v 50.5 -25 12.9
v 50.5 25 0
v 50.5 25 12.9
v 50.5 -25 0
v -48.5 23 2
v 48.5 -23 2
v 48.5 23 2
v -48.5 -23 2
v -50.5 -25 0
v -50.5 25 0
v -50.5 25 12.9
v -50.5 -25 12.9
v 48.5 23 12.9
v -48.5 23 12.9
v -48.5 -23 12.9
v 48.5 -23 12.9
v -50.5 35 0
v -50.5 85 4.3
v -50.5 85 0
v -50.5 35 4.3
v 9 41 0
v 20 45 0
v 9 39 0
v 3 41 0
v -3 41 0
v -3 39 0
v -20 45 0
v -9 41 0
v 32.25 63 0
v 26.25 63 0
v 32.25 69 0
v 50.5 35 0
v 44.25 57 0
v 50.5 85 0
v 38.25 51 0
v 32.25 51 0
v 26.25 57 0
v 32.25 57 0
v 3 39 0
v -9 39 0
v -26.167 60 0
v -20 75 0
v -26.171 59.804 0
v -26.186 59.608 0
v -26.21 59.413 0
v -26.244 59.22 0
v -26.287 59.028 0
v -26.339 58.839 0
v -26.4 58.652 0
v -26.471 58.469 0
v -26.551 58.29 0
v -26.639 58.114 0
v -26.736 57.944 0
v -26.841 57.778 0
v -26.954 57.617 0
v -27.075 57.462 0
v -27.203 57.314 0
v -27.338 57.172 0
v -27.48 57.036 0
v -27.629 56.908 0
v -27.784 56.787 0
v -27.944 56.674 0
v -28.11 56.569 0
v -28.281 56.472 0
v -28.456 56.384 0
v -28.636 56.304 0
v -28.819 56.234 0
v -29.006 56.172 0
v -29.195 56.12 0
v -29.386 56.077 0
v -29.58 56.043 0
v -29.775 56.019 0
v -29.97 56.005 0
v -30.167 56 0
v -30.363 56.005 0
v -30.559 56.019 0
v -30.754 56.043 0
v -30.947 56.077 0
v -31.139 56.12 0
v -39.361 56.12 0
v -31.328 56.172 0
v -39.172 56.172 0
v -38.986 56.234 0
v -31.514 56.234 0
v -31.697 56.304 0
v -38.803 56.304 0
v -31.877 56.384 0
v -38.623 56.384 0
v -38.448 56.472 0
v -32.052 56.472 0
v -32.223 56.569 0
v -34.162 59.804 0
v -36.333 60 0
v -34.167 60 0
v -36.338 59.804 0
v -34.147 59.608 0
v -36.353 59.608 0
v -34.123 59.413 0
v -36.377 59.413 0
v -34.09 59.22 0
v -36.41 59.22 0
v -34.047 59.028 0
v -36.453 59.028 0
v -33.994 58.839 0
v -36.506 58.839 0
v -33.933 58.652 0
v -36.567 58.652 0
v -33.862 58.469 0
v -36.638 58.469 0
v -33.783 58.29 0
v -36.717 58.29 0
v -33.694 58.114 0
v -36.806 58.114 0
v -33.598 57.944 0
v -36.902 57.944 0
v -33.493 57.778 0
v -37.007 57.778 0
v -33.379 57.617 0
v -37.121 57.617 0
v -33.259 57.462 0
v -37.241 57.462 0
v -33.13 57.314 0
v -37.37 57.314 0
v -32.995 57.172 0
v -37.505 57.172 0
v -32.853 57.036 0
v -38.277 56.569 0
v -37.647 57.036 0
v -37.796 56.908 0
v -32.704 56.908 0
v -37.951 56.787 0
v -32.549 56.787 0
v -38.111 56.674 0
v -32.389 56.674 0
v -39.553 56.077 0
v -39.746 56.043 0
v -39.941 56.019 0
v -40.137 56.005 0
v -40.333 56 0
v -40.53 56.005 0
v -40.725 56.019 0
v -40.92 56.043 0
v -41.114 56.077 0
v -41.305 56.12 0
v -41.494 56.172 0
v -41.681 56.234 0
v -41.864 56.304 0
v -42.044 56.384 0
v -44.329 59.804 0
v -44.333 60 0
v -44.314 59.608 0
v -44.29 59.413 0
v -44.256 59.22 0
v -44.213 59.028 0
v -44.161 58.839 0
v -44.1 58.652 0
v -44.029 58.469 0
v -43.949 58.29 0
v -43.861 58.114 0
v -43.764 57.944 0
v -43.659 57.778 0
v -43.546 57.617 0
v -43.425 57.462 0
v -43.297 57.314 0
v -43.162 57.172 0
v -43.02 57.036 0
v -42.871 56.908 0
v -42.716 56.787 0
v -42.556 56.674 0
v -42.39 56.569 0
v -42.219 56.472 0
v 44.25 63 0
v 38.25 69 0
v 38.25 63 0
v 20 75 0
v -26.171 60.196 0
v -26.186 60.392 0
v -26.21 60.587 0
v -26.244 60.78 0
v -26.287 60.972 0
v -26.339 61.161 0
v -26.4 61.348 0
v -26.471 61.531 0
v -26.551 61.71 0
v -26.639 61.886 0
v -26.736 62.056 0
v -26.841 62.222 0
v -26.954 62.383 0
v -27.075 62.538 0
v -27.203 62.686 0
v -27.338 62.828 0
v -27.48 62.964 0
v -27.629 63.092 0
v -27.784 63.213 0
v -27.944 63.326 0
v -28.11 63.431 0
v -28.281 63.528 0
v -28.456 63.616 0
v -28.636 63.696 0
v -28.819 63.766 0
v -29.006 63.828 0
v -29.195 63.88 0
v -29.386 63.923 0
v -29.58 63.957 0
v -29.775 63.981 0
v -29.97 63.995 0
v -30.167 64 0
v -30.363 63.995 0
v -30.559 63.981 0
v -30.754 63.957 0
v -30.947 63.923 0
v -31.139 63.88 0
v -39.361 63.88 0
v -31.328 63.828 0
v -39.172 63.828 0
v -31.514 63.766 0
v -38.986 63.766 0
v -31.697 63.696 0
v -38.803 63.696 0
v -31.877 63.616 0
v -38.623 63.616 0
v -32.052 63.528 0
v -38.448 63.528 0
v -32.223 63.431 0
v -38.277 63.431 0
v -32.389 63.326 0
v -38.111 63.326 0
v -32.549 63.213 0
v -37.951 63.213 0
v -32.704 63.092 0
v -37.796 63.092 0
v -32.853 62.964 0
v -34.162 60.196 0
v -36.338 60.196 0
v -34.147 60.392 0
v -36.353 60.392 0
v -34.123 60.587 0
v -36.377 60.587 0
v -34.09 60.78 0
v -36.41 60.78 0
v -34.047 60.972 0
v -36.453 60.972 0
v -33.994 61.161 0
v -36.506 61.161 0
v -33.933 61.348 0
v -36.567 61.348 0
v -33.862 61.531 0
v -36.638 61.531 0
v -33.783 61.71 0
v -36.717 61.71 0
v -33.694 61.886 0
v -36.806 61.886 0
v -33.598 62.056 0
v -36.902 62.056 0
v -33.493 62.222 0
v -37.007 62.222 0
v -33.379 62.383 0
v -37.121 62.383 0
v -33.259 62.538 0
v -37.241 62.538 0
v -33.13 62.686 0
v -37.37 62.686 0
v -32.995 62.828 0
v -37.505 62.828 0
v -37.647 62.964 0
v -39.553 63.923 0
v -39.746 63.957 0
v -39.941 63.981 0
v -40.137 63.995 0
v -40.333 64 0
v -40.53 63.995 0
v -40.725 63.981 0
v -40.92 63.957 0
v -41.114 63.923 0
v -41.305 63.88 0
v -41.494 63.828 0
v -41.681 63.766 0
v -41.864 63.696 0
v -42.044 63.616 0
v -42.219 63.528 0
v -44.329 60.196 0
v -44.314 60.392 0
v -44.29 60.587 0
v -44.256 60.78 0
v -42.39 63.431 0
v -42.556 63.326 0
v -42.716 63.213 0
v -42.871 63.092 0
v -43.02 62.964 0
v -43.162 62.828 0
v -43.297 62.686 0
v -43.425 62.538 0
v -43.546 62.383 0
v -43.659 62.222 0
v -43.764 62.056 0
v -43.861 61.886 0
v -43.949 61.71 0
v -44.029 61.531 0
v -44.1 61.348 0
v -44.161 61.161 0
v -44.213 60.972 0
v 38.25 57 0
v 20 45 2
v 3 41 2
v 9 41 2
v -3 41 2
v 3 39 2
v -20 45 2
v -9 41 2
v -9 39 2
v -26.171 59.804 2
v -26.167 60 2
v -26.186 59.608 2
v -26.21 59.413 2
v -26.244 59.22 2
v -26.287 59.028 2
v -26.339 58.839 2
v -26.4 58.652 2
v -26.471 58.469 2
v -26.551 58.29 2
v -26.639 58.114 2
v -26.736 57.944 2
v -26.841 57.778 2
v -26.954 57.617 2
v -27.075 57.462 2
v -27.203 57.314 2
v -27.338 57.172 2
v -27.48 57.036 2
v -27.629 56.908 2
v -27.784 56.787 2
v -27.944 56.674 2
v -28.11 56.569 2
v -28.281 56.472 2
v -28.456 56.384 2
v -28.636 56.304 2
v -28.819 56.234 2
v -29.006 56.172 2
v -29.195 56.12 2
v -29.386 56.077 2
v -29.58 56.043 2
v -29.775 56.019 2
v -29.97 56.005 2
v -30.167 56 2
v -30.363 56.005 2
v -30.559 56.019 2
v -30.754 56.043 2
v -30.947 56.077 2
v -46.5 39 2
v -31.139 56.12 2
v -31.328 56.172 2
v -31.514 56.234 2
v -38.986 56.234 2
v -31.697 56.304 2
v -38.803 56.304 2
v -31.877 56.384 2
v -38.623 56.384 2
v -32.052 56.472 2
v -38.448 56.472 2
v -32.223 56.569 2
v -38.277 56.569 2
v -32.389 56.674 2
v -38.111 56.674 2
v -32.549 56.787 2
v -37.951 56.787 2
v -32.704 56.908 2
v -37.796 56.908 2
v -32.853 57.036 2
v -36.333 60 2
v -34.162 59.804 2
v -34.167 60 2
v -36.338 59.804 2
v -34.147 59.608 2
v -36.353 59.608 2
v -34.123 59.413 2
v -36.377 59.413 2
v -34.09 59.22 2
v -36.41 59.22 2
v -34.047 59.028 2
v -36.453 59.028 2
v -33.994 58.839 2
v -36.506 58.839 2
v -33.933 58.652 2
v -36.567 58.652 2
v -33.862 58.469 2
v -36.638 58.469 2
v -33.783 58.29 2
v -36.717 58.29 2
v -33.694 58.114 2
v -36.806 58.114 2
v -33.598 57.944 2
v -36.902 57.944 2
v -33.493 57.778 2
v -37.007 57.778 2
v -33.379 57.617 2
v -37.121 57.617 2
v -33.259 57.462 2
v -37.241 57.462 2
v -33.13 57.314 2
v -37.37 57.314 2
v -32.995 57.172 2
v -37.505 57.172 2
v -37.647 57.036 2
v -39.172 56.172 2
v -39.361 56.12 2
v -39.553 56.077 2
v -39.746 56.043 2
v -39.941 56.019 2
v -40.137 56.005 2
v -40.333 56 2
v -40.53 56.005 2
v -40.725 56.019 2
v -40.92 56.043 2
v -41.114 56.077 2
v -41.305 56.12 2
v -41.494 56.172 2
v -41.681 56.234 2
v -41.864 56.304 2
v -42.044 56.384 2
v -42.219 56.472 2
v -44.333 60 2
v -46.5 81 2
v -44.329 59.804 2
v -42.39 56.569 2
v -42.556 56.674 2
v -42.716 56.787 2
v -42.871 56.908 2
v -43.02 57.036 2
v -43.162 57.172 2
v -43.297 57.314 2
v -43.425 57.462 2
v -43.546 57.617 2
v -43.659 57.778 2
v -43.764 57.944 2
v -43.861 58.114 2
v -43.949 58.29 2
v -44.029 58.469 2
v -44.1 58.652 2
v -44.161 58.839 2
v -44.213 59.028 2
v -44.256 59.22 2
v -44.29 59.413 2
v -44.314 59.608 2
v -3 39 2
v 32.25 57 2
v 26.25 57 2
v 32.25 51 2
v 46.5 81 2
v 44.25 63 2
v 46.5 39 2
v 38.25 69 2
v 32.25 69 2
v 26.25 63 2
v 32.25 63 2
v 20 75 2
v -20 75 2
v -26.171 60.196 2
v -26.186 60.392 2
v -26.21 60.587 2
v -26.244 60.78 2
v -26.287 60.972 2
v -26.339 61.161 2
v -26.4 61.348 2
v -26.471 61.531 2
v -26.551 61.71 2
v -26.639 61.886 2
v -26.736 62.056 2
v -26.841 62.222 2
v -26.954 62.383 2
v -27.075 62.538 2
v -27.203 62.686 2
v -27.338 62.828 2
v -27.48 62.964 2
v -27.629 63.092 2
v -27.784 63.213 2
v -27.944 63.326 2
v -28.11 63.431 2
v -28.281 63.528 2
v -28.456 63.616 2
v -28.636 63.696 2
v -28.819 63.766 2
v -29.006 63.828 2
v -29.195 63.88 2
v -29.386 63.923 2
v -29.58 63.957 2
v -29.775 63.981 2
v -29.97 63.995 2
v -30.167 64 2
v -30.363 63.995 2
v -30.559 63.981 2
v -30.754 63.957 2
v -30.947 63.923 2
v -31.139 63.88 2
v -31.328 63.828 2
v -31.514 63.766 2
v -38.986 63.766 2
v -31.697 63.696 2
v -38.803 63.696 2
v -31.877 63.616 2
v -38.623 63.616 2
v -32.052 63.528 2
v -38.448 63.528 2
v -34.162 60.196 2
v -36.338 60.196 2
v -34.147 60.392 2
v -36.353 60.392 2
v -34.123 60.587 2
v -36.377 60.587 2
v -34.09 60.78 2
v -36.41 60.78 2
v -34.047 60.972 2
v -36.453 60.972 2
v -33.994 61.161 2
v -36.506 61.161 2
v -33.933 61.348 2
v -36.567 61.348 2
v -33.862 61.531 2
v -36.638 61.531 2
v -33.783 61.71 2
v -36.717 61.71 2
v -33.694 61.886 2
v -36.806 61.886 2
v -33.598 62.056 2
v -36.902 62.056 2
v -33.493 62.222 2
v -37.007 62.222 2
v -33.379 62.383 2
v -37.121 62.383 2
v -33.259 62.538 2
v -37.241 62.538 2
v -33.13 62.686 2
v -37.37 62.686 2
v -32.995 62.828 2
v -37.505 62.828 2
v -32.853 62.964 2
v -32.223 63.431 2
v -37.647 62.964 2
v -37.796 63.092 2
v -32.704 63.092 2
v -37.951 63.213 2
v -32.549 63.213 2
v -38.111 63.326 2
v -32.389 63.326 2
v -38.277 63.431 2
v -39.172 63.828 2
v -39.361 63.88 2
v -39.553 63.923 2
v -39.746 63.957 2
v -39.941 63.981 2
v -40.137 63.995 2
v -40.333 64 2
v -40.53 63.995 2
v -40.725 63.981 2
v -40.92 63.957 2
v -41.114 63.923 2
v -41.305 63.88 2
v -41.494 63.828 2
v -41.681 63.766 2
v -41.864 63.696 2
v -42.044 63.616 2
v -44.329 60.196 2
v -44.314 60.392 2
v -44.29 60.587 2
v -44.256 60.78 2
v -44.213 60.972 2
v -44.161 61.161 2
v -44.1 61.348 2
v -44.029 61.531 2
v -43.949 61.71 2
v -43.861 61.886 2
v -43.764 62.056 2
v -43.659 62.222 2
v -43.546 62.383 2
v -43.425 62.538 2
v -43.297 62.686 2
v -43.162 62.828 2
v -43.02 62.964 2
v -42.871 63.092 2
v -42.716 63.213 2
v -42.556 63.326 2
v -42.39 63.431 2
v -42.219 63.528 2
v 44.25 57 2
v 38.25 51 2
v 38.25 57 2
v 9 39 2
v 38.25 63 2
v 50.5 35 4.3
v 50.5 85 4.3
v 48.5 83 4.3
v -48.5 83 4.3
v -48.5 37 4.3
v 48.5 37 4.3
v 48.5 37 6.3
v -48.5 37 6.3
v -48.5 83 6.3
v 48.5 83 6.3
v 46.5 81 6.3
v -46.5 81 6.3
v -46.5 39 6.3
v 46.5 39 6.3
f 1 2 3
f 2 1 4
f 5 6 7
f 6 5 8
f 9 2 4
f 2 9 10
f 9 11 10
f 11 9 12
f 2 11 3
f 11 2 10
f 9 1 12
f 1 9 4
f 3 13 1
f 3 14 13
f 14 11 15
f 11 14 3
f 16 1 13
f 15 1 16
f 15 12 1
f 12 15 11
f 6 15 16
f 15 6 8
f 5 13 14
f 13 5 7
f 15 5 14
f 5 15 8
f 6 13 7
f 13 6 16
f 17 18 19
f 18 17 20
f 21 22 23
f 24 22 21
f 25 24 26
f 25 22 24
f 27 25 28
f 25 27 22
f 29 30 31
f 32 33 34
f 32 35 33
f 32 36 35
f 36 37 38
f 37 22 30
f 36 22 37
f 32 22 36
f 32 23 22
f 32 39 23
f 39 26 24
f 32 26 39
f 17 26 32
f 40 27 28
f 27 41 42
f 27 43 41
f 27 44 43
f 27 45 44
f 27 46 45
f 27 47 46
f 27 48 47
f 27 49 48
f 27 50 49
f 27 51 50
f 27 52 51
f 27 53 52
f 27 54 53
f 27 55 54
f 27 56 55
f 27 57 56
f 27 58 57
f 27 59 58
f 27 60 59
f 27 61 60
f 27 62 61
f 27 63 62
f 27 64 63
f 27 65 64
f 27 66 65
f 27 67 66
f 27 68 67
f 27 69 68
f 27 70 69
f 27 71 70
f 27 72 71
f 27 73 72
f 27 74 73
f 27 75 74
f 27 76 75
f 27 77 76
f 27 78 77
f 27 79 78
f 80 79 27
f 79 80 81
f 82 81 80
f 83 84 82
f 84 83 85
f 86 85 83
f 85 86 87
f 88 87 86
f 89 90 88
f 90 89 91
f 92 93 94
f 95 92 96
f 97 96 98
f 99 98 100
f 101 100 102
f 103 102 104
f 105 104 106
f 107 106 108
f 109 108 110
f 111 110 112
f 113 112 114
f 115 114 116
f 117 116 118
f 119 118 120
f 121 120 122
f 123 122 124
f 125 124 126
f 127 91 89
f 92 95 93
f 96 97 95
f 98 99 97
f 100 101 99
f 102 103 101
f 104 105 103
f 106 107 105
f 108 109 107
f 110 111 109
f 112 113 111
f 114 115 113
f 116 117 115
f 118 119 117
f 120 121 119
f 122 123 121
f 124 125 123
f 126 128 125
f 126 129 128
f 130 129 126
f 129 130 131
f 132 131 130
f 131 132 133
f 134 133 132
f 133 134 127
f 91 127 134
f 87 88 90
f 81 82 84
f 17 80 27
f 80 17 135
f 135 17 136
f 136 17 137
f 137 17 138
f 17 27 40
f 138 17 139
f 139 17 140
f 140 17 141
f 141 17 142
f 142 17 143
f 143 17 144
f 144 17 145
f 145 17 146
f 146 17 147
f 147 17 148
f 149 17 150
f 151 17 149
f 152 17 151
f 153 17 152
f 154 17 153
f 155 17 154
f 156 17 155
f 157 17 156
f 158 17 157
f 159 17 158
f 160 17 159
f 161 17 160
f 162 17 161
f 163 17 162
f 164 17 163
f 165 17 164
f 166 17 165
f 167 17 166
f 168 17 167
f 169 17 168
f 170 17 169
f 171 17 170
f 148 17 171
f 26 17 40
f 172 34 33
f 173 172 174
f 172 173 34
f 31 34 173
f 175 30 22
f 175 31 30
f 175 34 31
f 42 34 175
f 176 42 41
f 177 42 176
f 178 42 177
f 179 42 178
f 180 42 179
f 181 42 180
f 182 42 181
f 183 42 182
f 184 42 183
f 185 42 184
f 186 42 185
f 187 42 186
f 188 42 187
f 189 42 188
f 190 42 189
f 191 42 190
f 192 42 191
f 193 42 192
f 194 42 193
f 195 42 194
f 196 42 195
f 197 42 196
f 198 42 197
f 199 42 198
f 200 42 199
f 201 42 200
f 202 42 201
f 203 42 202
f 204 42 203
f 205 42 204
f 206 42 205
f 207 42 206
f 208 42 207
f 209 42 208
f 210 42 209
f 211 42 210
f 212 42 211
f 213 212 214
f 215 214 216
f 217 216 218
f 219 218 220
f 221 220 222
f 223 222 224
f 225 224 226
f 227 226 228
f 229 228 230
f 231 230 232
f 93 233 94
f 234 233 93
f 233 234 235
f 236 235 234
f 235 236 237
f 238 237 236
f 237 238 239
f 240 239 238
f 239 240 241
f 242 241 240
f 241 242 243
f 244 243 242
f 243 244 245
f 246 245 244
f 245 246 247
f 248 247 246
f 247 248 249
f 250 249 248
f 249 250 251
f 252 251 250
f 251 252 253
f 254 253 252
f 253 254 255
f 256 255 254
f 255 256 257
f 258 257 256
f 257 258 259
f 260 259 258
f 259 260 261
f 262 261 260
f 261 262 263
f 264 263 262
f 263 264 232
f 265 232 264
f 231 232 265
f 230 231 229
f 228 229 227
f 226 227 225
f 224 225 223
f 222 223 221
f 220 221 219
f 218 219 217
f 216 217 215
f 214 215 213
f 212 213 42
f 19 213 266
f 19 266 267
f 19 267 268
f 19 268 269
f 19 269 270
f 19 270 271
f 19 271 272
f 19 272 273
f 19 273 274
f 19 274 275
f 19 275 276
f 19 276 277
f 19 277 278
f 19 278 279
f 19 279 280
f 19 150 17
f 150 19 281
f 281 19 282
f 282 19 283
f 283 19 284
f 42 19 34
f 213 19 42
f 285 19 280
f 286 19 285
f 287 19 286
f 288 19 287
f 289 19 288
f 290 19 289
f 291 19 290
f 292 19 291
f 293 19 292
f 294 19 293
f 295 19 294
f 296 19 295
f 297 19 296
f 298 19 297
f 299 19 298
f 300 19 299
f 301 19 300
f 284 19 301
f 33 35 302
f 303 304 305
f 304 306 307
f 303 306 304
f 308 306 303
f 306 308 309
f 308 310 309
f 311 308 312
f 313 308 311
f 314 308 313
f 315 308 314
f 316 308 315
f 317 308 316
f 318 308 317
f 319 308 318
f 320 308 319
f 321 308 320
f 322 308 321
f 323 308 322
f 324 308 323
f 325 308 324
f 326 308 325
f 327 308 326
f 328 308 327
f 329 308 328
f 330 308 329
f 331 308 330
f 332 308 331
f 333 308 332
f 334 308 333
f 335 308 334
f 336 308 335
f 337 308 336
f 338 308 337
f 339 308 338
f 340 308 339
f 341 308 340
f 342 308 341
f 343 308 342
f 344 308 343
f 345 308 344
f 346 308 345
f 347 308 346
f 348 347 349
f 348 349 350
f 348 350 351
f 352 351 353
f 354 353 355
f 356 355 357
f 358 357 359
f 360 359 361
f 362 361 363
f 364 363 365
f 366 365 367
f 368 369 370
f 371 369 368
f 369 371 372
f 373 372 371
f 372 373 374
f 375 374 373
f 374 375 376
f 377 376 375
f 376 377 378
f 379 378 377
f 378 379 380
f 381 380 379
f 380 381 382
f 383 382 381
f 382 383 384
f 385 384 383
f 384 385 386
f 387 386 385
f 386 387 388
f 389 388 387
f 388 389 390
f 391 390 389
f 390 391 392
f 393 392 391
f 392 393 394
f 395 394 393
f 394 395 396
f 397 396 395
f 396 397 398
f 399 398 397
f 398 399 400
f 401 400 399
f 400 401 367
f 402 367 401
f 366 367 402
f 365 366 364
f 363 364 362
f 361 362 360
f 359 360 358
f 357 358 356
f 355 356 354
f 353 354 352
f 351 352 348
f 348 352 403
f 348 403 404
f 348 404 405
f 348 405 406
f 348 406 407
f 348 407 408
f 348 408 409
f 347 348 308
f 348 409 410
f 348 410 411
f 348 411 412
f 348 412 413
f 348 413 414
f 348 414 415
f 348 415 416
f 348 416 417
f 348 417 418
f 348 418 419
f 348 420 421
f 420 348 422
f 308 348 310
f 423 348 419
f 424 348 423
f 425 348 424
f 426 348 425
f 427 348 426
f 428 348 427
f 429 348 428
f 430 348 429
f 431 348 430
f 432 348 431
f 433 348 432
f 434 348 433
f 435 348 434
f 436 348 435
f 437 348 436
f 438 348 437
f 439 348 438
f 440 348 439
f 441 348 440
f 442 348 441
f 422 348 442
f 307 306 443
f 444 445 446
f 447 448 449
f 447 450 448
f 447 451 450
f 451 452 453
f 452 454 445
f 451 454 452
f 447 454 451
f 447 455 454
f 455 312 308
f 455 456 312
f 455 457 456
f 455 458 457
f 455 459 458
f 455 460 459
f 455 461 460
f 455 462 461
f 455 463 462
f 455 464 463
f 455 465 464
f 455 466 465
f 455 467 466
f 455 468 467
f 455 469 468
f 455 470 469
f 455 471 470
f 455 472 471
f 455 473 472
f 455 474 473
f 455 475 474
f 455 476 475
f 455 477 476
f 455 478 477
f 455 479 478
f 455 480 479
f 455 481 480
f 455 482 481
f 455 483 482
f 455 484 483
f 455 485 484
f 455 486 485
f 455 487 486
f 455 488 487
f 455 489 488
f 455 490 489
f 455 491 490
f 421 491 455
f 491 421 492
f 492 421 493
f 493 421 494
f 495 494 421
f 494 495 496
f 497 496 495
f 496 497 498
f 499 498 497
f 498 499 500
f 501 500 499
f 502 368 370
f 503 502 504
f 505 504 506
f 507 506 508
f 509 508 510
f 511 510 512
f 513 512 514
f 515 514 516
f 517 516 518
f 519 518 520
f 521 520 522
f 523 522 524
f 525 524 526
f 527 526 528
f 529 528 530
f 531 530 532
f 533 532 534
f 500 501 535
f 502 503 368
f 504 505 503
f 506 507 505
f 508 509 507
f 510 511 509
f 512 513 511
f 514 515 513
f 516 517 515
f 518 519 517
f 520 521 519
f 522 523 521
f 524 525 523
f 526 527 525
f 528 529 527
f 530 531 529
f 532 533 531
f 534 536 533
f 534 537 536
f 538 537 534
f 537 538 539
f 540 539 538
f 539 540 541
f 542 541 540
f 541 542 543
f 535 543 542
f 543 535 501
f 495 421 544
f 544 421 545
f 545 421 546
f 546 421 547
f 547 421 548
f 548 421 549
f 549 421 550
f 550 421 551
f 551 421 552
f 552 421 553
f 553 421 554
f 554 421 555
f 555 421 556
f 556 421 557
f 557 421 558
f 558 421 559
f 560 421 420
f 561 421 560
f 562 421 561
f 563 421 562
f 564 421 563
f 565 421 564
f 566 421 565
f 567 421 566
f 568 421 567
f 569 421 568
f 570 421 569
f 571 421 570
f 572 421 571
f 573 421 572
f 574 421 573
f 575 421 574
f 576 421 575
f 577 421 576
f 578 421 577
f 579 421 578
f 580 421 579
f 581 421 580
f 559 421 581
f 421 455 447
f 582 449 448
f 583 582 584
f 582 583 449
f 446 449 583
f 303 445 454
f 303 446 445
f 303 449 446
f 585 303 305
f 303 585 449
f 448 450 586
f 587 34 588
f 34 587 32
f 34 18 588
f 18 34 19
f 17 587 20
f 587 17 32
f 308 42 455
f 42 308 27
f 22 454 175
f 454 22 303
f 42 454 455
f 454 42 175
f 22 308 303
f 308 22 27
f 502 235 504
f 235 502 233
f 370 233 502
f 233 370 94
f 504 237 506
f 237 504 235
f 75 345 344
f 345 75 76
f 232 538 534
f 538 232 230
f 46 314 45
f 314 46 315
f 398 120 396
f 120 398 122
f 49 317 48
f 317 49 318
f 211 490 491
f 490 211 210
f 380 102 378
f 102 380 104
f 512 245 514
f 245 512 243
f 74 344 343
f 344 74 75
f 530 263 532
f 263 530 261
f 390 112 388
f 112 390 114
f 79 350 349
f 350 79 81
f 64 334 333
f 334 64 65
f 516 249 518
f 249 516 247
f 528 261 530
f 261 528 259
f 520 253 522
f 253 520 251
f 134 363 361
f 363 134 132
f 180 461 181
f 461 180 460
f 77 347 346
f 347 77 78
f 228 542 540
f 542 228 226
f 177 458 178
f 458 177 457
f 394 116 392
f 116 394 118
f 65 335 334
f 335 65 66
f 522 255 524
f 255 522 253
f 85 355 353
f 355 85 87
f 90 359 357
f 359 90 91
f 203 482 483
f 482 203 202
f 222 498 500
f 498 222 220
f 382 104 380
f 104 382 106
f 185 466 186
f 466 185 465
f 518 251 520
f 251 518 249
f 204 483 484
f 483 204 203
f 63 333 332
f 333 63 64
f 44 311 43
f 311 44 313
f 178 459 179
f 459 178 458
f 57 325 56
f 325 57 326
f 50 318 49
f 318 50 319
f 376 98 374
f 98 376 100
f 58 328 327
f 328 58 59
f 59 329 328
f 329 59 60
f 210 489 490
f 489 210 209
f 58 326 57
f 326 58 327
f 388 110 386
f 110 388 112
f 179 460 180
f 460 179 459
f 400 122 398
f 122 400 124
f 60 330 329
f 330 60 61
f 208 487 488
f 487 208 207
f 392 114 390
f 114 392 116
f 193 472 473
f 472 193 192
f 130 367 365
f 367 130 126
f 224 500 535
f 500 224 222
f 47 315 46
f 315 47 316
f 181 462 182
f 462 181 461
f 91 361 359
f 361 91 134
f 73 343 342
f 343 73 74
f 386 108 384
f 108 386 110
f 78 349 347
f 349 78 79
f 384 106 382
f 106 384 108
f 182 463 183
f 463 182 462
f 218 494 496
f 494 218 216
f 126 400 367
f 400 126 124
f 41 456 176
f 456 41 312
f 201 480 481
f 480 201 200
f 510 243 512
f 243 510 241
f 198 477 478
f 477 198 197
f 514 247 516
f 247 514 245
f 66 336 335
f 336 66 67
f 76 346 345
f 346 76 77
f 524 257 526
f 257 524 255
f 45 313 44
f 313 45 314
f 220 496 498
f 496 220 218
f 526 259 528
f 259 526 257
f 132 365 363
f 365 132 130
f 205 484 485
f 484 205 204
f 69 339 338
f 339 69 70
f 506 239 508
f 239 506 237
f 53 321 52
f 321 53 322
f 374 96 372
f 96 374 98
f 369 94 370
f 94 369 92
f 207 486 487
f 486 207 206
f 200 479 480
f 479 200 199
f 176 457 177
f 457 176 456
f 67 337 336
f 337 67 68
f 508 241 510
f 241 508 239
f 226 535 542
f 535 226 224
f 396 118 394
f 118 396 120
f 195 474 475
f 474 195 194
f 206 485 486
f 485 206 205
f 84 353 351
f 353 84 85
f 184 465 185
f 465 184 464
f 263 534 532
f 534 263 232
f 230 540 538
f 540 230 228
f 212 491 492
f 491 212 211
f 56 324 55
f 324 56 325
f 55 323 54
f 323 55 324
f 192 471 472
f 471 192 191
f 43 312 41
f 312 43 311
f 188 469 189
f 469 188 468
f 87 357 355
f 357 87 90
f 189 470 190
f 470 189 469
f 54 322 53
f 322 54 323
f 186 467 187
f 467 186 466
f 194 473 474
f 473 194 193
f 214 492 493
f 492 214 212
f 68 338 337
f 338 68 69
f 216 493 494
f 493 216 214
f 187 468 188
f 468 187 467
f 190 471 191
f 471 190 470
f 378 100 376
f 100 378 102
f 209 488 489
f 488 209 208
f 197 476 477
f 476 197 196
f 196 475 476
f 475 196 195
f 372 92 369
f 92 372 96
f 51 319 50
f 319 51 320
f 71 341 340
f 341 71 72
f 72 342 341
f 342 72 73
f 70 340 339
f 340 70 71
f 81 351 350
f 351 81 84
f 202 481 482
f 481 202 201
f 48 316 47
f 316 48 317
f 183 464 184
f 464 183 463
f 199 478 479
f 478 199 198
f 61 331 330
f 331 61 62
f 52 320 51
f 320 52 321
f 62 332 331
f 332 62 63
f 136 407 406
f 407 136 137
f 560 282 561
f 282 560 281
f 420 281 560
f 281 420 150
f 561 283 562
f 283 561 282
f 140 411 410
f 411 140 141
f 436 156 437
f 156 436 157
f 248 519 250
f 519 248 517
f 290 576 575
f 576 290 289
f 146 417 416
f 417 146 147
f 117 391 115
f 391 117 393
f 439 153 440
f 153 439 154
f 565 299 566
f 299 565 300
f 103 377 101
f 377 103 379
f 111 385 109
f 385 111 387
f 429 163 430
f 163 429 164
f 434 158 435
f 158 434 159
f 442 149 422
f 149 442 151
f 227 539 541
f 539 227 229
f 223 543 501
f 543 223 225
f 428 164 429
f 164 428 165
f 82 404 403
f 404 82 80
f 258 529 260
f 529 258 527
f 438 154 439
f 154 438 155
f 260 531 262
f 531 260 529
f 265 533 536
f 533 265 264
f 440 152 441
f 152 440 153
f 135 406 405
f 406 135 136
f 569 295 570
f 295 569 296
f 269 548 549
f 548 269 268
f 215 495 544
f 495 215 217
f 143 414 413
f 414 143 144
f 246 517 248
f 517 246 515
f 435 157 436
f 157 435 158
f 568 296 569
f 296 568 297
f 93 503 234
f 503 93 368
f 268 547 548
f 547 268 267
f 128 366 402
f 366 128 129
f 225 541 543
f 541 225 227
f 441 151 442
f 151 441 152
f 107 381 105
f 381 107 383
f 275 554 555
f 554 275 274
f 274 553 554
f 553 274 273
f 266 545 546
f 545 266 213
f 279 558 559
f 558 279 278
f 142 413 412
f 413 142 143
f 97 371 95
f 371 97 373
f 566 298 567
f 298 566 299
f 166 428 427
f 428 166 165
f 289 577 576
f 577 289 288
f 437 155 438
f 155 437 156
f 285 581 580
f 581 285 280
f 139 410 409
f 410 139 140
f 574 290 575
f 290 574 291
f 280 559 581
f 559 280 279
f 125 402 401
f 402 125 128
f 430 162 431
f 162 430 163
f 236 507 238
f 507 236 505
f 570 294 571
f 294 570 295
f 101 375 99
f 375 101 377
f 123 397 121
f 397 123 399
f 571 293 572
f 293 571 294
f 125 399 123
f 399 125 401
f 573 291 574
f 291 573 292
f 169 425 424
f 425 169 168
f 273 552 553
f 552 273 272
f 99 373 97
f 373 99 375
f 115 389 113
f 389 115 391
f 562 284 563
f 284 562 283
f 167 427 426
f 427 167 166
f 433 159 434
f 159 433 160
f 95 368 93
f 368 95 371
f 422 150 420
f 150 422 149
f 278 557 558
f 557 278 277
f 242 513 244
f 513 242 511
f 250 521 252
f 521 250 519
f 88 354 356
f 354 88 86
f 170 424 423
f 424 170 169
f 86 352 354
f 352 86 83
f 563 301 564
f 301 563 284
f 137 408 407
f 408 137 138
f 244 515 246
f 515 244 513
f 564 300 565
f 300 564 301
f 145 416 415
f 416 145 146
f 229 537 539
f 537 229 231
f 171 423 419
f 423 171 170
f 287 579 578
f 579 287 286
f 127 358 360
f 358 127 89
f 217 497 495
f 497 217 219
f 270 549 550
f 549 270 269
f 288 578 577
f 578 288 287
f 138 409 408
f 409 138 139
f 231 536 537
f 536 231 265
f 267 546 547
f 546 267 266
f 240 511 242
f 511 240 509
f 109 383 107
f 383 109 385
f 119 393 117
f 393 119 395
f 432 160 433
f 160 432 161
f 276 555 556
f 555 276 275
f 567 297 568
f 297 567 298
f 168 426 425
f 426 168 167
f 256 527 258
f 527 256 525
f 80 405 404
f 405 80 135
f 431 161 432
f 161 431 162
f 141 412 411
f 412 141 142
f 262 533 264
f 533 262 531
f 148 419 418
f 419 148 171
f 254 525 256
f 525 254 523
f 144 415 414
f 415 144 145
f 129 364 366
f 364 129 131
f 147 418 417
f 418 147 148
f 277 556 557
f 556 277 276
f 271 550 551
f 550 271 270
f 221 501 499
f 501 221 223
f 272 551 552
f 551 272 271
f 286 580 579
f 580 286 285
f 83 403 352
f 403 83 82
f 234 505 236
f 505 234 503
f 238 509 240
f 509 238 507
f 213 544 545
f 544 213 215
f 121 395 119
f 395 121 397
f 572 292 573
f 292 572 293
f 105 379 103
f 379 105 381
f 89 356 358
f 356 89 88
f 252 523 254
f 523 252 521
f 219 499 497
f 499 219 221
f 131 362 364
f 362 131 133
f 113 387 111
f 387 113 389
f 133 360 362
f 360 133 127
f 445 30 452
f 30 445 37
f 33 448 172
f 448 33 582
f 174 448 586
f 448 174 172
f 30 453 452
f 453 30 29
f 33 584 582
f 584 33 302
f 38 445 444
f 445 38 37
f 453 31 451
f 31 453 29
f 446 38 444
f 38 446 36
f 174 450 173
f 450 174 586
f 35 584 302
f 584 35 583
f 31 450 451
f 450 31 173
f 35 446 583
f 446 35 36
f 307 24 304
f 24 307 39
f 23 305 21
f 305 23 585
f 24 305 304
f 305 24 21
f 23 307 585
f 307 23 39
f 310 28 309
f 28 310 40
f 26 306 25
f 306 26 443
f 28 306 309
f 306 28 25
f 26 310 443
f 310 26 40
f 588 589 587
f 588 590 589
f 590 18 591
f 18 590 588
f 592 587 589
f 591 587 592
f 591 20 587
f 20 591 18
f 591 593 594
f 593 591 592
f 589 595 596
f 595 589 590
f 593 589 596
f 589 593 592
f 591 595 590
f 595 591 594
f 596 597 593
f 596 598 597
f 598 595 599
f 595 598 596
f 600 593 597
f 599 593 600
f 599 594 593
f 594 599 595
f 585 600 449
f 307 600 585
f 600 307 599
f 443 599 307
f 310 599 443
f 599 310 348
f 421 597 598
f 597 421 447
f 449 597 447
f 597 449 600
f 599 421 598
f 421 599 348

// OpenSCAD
$fn = 128;

// Set to 0.01 for higher definition curves (renders slower)
$fs = 0.25;

module roundedcube(size = [1, 1, 1], center = false, radius = 0.5, apply_to = "all") {
	// If single value, convert to [x, y, z] vector
	size = (size[0] == undef) ? [size, size, size] : size;

	translate_min = radius;
	translate_xmax = size[0] - radius;
	translate_ymax = size[1] - radius;
	translate_zmax = size[2] - radius;

	diameter = radius * 2;

	obj_translate = (center == false) ?
		[0, 0, 0] : [
			-(size[0] / 2),
			-(size[1] / 2),
			-(size[2] / 2)
		];

	translate(v = obj_translate) {
		hull() {
			for (translate_x = [translate_min, translate_xmax]) {
				x_at = (translate_x == translate_min) ? "min" : "max";
				for (translate_y = [translate_min, translate_ymax]) {
					y_at = (translate_y == translate_min) ? "min" : "max";
					for (translate_z = [translate_min, translate_zmax]) {
						z_at = (translate_z == translate_min) ? "min" : "max";

						translate(v = [translate_x, translate_y, translate_z])
						if (
							(apply_to == "all") ||
							(apply_to == "xmin" && x_at == "min") || (apply_to == "xmax" && x_at == "max") ||
							(apply_to == "ymin" && y_at == "min") || (apply_to == "ymax" && y_at == "max") ||
							(apply_to == "zmin" && z_at == "min") || (apply_to == "zmax" && z_at == "max")
						) {
							sphere(r = radius);
						} else {
							rotate = 
								(apply_to == "xmin" || apply_to == "xmax" || apply_to == "x") ? [0, 90, 0] : (
								(apply_to == "ymin" || apply_to == "ymax" || apply_to == "y") ? [90, 90, 0] :
								[0, 0, 0]
							);
							rotate(a = rotate)
							cylinder(h = diameter, r = radius, center = true);
						}
					}
				}
			}
		}
	}
}

// These measurements are in mm
x = 101;
y = 50;
z = 17.2;

padding = 2;

bottom_z = z *3/4;
top_z = z *1/4;

display_w = 40;
display_h = 30;

button_size = 4;
dpad_thickness = 6;

ss_w = 6;
ss_h = 2;

// Extra size to ensure culling
bore = 0.125;

// Bottom
/**/
translate([0,0,0]){
    translate([-x/2,-y/2,0]) cube([x,y,padding]);
    translate([-x/2,-y/2,0]) cube([x,padding,bottom_z]);
    translate([-x/2, y/2-padding,0]) cube([x,padding,bottom_z]);
    translate([-x/2,-y/2,0]) cube([padding,y,bottom_z]);
    translate([ x/2-padding,-y/2,0]) cube([padding,y,bottom_z]);
}
/**/

// Top
translate([0,y+10,0]){ // Put the lide next to the base
//translate([0,0,z]){ // Put it on top
    rotate(a=[0,180,0]){ // Lid upside down
    //rotate(a=[0,0,0]){ // Lid on top
        
        difference(){
            
            // front plate  
            translate([-x/2,-y/2,-padding])
                cube([x,y,padding],apply_to="zmax");
            
            display_x_offset = (x - display_w)/2;
            display_y_offset = (y - display_h)/2;
            
            display_side_width = (x - display_w)/2;
            
            // screen
            translate(
                [-x/2+display_x_offset,-y/2+display_y_offset,-padding-bore])
                cube([display_w,display_h,padding+bore*2]);
            
            // Buttons
            
            button_a = display_w/2 + display_side_width / 3;
            translate([button_a,0,-padding/2])
                cylinder(h=padding+bore*2,r=button_size,center=true);
            button_b = display_w/2 + display_side_width * 2 / 3;
            translate([button_b,0,-padding/2])
                cylinder(h=padding+bore*2,r=button_size,center=true);
                
            // D-pad
            
            dpad_center = display_side_width / 2;
            
            translate([-display_side_width/2-display_w/2,0,-padding/2])
                cube([ dpad_thickness*3, dpad_thickness,padding+bore*2],center=true);

            translate([-display_side_width/2-display_w/2,0,-padding/2])
                cube([ dpad_thickness, dpad_thickness*3,padding+bore*2],center=true);
                
            // Select/start
            
            ss_center = -display_h/2 - (y - display_h)/4;
            
            translate([-ss_w,ss_center,-padding*1.5])
                cube([ss_w,ss_h,padding+bore*2+padding*2],center=true);
                
            translate([ss_w,ss_center,-padding*1.5])
                cube([ss_w,ss_h,padding+bore*2+padding*2],center=true);
            
        }
        
        // Edges
        
        
        translate([-x/2,-y/2,-top_z])
            cube([x,padding,top_z-padding]);
        translate([-x/2, y/2-padding,-top_z])
            cube([x,padding,top_z-padding]);
        translate([-x/2,-y/2,-top_z])
            cube([padding,y,top_z-padding]);
        translate([ x/2-padding,-y/2,-top_z])
            cube([padding,y,top_z-padding]);

        
        // Inlay edges
        
        translate([-x/2+padding,-y/2+padding,-top_z-padding])
            cube([x-padding*2,padding,top_z]);
        
        translate([-x/2+padding,y/2-padding*2,-top_z-padding])
            cube([x-padding*2,padding,top_z]);
        
        translate([-x/2+padding,-y/2+padding,-top_z-padding])
            cube([padding,y-padding*2,top_z]);
        
        translate([x/2-padding*2,-y/2+padding,-top_z-padding])
            cube([padding,y-padding*2,top_z]);
        
    }
}
